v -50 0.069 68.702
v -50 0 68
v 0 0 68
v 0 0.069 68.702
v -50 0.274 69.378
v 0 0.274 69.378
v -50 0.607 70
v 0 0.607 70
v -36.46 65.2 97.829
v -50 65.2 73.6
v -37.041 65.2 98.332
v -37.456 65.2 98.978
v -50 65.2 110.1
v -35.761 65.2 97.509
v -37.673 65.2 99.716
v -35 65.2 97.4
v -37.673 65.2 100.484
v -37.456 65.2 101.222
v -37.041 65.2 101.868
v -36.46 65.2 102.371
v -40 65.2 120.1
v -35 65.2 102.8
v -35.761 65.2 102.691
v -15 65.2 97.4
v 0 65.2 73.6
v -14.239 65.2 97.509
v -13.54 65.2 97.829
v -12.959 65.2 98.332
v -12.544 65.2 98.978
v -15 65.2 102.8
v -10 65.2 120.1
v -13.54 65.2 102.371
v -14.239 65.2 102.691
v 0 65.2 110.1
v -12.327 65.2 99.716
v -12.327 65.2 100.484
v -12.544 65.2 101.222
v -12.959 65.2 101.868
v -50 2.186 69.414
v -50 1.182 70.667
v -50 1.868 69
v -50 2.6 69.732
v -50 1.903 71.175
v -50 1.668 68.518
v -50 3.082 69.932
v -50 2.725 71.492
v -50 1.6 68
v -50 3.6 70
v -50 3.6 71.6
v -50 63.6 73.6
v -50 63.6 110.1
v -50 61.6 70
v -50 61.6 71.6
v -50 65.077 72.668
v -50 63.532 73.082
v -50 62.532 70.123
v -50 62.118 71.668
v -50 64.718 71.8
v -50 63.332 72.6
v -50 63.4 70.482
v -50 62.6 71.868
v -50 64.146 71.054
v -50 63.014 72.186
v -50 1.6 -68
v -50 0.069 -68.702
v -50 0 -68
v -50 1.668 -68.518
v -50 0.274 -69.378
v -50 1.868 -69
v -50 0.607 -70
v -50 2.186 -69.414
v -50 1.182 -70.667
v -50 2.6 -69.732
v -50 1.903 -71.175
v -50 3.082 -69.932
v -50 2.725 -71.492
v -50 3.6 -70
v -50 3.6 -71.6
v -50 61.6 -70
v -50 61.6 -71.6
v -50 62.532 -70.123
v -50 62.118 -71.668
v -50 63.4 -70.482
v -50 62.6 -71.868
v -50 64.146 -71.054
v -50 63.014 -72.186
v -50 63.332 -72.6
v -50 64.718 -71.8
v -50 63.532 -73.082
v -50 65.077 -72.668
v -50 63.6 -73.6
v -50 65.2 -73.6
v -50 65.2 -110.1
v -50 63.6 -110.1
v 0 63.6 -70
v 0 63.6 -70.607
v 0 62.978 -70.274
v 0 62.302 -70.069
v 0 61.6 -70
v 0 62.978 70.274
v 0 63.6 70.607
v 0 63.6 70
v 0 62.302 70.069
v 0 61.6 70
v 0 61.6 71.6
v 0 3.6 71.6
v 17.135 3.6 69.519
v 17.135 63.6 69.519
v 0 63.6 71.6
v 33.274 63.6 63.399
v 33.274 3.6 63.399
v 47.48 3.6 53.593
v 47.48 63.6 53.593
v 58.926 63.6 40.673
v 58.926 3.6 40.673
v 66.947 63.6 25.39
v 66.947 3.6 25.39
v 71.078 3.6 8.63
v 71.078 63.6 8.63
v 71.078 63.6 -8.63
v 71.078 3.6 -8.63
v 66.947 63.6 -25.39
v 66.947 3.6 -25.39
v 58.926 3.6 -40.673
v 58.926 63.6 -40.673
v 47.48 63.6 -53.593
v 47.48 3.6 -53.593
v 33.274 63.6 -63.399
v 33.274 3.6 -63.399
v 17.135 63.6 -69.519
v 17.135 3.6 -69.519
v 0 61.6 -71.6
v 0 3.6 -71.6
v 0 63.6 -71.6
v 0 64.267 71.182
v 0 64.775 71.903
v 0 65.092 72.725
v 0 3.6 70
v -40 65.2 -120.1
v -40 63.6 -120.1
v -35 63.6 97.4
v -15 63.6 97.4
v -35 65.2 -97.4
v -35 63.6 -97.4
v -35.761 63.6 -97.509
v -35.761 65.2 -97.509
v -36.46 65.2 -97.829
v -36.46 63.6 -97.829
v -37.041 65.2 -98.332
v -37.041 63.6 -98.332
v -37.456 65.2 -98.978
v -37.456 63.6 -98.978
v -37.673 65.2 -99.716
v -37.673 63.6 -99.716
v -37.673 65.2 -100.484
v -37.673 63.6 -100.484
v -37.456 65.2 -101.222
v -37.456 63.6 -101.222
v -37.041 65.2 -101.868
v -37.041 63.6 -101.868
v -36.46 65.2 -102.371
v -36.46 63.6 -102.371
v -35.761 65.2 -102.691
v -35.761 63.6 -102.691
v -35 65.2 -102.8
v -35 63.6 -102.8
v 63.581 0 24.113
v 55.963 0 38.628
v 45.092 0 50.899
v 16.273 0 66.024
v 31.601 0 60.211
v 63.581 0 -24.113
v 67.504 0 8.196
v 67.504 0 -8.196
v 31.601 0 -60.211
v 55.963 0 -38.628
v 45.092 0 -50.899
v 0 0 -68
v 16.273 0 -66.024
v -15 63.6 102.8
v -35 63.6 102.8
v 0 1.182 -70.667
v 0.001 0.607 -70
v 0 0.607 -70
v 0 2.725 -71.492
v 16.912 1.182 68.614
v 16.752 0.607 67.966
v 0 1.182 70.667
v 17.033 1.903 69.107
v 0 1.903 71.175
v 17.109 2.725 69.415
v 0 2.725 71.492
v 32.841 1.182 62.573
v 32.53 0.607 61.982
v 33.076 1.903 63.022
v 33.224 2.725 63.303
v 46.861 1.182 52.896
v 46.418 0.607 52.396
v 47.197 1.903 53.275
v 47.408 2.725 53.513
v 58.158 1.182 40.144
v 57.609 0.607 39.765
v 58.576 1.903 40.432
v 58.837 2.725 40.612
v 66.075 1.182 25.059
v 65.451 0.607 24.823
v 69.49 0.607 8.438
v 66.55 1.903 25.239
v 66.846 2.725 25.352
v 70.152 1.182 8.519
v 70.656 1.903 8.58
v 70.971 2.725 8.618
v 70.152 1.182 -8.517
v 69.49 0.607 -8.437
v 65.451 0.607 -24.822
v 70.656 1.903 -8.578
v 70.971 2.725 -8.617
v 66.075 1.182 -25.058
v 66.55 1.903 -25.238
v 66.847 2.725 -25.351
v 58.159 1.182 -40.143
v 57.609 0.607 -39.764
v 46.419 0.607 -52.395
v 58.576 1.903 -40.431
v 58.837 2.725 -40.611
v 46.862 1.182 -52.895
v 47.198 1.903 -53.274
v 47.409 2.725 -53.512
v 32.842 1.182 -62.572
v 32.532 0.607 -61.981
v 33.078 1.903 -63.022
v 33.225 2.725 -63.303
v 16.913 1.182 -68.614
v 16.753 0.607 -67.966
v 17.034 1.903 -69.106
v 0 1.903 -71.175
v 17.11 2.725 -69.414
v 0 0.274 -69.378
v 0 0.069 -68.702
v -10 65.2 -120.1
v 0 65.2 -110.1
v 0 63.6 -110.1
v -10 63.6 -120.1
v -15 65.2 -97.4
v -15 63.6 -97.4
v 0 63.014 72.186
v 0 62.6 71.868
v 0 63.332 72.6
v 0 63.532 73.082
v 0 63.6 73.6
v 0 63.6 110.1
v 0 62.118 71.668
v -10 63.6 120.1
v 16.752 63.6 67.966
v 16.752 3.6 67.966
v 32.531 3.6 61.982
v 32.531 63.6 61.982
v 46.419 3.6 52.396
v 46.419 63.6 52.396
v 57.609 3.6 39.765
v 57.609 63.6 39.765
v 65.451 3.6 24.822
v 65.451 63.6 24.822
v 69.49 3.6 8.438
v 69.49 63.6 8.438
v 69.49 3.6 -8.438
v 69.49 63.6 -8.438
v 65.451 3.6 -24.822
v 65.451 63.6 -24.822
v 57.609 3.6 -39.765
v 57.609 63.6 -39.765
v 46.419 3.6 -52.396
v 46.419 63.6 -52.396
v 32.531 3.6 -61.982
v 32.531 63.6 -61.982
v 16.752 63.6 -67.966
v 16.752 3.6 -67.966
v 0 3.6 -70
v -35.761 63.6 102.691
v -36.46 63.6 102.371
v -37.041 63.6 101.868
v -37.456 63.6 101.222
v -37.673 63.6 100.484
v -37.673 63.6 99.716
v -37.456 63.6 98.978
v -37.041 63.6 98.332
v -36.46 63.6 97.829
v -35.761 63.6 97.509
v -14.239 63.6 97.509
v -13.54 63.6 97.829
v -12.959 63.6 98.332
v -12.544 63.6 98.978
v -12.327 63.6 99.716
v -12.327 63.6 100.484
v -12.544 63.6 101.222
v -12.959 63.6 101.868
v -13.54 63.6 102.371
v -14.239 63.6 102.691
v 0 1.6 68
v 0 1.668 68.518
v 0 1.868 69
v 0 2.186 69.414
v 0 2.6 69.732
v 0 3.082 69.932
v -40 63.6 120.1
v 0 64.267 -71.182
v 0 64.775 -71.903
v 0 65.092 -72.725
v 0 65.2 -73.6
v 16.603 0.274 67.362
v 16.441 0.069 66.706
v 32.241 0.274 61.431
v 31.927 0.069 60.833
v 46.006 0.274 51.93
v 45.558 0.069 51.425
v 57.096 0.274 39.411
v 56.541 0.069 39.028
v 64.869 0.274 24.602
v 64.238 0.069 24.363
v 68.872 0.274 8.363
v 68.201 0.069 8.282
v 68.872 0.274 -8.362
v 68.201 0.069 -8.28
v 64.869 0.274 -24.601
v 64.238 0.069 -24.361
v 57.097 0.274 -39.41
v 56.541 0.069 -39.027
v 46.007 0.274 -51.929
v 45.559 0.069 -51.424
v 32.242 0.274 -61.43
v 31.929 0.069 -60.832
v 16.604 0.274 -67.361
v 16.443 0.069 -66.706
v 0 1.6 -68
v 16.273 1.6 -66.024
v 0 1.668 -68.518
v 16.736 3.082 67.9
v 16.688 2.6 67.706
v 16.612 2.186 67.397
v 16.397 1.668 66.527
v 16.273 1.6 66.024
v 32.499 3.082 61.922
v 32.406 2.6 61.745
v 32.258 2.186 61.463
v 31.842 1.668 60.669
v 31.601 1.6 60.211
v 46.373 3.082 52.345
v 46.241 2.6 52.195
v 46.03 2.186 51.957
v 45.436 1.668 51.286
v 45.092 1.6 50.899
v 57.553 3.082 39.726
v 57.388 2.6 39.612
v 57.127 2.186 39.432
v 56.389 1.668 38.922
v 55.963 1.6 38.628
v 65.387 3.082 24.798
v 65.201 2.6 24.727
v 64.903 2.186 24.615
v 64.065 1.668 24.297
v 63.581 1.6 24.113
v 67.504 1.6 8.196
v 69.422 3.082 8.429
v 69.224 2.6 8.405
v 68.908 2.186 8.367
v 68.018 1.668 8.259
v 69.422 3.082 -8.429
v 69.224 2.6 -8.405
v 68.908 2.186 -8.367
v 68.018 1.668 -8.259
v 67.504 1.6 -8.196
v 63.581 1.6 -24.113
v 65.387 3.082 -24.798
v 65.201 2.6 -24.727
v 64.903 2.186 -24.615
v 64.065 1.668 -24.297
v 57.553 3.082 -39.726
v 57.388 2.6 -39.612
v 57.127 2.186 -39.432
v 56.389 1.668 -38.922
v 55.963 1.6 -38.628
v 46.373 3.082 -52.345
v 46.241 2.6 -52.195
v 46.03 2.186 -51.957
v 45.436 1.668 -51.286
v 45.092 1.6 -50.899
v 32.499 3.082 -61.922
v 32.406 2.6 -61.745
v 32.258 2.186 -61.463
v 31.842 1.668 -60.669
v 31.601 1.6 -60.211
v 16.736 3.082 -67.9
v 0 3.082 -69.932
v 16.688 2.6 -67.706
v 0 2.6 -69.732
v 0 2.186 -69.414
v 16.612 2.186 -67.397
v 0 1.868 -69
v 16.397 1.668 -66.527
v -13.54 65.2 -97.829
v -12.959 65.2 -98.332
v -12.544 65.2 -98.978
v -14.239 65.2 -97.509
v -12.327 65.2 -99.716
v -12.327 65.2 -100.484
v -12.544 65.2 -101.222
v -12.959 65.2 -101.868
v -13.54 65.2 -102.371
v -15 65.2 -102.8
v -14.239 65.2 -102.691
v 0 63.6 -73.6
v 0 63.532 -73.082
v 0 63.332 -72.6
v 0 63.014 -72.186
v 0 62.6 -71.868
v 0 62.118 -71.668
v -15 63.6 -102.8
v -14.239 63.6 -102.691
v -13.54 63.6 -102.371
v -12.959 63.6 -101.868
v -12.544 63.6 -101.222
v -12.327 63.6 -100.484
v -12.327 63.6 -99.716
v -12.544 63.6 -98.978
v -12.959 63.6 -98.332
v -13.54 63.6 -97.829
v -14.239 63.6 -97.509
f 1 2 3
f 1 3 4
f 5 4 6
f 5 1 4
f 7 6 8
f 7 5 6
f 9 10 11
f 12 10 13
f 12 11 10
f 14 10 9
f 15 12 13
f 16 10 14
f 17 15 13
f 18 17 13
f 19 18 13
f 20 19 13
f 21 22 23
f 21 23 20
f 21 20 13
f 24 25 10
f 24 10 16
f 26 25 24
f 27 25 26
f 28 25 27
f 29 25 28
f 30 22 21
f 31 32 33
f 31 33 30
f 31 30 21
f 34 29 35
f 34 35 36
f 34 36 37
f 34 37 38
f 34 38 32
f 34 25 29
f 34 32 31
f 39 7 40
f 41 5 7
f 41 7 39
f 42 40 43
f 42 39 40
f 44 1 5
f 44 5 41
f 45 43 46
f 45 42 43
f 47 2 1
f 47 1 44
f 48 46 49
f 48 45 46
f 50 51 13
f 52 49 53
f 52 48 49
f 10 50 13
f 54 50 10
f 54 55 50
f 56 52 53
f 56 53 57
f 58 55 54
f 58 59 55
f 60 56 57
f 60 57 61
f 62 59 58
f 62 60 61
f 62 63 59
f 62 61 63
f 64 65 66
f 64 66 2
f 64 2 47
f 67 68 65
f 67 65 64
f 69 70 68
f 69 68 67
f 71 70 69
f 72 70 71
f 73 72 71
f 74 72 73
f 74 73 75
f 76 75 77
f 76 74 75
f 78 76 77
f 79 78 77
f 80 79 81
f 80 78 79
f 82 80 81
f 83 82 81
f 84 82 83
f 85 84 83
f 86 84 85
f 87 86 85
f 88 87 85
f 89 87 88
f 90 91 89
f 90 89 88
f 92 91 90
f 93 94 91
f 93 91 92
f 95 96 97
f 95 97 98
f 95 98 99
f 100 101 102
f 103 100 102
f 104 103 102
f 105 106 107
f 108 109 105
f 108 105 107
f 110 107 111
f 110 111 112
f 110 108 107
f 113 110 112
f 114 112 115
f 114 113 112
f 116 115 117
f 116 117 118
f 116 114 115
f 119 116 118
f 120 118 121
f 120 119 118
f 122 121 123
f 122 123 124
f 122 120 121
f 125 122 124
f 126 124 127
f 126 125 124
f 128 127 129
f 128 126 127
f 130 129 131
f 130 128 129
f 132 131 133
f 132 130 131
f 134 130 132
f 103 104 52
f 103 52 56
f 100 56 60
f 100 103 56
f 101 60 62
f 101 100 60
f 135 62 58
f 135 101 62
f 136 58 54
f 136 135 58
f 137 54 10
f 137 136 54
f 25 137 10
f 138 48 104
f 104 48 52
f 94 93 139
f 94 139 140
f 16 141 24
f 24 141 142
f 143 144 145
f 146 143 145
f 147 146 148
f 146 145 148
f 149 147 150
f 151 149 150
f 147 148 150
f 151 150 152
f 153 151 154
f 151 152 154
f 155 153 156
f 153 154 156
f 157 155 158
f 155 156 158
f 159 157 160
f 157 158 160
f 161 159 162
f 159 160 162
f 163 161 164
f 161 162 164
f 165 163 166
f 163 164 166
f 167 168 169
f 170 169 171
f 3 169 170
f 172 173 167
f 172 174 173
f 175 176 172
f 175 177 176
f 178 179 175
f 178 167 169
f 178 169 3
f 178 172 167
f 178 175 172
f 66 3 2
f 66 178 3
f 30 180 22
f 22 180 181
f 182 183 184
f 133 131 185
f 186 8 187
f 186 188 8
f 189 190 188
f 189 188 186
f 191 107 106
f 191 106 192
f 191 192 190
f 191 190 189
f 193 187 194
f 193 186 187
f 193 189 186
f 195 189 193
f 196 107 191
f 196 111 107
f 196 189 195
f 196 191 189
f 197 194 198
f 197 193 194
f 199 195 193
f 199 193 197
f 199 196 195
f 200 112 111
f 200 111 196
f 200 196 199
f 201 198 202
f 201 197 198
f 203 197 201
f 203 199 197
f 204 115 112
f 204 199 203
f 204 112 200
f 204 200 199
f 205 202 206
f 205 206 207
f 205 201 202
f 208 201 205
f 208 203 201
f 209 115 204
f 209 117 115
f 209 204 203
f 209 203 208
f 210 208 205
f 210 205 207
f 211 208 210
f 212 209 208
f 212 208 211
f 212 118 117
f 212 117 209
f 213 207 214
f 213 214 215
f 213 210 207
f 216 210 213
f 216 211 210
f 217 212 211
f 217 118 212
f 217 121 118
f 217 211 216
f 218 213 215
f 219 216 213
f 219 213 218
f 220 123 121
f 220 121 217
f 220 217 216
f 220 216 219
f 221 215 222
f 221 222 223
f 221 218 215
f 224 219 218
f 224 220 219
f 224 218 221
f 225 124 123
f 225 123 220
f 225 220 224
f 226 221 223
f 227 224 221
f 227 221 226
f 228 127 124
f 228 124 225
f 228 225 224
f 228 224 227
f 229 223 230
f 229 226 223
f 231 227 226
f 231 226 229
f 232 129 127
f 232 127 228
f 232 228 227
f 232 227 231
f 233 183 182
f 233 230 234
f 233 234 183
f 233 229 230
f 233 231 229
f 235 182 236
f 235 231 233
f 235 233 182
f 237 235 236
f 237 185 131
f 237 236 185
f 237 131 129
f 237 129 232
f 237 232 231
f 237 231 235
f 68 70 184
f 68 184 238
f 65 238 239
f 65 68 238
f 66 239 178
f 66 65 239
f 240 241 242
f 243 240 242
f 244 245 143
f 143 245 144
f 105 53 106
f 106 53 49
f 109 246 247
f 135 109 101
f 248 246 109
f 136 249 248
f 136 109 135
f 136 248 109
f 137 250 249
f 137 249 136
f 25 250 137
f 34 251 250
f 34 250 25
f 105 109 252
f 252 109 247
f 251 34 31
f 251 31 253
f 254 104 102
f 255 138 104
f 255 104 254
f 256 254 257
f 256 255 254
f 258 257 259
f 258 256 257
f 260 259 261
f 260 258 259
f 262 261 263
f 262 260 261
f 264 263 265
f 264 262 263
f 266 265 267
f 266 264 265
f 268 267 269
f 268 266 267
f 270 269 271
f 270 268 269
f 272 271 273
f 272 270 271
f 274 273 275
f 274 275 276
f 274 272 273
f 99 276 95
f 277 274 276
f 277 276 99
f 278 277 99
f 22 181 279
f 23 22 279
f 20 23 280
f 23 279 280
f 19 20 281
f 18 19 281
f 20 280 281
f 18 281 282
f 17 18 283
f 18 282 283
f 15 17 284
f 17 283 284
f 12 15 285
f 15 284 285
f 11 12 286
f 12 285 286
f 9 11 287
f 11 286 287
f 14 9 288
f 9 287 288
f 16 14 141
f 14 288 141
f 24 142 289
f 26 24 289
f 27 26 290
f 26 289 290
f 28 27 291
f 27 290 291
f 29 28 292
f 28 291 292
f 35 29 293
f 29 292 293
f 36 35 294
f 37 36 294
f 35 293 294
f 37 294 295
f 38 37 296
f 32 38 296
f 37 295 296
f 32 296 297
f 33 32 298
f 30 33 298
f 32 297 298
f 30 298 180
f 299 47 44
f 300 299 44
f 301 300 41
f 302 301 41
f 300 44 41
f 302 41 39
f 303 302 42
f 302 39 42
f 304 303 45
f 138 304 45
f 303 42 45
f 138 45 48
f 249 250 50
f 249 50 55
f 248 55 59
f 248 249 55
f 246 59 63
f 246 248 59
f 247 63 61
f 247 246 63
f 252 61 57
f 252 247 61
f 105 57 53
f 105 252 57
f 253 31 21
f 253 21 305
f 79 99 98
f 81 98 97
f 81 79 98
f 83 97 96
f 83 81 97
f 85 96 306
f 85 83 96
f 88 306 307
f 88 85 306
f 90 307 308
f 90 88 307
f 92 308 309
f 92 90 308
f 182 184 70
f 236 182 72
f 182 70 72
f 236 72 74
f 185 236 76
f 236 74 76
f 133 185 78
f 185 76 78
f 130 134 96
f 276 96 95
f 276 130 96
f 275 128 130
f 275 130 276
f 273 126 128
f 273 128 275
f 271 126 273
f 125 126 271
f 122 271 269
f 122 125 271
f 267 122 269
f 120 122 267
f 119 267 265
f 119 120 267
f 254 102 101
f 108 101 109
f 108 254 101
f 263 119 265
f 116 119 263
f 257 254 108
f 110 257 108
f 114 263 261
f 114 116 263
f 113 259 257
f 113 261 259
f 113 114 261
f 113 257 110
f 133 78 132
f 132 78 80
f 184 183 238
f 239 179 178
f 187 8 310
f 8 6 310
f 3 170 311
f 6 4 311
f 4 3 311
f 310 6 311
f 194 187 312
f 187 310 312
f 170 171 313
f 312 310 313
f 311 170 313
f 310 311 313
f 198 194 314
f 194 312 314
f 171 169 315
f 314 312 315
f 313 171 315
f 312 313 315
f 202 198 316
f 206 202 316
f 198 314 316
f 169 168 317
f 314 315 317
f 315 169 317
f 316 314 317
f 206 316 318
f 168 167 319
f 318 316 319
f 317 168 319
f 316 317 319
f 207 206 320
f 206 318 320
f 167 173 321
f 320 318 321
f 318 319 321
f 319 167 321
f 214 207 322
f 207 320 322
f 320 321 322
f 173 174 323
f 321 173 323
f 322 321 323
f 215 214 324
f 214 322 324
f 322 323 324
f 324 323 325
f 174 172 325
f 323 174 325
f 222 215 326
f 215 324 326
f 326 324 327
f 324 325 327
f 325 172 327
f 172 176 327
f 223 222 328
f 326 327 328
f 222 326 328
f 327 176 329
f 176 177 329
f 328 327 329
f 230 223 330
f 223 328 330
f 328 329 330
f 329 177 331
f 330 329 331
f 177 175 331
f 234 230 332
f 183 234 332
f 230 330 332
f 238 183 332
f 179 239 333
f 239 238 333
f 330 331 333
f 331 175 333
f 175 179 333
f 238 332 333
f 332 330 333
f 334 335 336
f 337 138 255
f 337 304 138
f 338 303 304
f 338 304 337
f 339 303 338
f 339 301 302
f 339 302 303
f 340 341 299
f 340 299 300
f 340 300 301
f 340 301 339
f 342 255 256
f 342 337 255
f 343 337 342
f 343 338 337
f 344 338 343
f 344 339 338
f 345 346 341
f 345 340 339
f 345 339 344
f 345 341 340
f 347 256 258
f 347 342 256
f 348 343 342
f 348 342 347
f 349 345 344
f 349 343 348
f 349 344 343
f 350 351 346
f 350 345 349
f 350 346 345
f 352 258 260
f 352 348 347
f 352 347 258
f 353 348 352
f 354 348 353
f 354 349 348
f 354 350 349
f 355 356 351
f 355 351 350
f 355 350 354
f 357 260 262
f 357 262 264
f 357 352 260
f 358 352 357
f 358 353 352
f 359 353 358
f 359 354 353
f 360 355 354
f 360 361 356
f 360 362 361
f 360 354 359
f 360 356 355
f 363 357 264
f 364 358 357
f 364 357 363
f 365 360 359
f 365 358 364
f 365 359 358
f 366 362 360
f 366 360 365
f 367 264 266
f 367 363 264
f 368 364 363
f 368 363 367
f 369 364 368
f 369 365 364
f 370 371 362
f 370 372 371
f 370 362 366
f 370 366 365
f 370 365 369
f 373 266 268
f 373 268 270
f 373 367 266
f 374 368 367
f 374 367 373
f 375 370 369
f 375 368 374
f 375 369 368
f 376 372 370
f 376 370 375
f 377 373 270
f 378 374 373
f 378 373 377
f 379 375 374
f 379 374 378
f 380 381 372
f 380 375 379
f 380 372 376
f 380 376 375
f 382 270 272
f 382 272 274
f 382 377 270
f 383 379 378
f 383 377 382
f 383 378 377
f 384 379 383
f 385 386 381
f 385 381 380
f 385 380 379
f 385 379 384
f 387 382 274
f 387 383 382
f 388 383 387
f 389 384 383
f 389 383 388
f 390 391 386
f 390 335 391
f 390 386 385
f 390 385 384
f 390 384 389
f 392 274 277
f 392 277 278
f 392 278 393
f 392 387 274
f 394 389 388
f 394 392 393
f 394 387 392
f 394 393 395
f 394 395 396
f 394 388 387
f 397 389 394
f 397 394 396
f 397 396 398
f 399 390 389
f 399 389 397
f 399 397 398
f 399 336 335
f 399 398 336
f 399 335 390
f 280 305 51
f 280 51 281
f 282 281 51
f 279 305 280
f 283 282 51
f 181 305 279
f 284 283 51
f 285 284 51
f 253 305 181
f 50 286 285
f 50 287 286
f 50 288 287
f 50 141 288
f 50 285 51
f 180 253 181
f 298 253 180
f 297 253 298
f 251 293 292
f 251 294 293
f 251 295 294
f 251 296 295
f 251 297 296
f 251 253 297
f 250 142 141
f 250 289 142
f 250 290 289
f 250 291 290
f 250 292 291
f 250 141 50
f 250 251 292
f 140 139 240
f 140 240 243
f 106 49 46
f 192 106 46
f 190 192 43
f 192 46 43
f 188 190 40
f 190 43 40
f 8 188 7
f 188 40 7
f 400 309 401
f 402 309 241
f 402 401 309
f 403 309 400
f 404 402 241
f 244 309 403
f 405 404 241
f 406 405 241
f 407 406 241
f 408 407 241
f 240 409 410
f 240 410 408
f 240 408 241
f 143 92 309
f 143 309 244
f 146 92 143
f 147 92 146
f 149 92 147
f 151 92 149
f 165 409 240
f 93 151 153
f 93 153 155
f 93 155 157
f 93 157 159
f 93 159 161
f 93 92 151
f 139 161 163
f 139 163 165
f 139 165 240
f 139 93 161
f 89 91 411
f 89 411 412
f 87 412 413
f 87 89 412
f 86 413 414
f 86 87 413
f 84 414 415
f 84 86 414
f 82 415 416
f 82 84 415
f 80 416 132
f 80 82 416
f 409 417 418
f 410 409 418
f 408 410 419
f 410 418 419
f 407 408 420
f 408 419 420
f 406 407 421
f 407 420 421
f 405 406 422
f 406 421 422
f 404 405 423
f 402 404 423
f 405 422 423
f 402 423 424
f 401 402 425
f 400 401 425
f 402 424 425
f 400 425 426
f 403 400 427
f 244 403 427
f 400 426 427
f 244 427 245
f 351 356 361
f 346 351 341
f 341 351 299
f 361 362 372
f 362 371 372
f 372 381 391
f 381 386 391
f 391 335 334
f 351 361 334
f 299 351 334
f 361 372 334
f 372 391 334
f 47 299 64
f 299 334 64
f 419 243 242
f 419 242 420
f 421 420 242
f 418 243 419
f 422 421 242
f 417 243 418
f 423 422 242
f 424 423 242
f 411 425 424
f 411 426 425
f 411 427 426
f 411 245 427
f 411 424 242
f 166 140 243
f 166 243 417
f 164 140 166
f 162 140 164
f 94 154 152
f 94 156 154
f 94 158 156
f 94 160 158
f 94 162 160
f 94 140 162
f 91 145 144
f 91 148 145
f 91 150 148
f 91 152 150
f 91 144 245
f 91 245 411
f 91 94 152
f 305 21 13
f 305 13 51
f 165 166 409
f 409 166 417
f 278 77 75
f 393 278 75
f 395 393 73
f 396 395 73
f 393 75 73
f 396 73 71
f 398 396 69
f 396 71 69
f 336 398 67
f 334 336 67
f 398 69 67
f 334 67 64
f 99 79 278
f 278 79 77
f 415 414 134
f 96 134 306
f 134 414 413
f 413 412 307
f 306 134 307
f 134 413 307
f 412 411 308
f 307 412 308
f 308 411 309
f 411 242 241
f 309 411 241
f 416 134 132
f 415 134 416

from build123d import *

# Parameters (mm, degrees)
SM_BASE_FLANGE_2_DEPTH             = 1.6
SM_START                           = -50
SM_EDGE_FLANGE_2_DEPTH             = 121.6
SM_EDGE_FLANGE_2_2_DEPTH           = 50
SM_EDGE_FLANGE_2_3_ANGLE           = 180
SM_EDGE_FLANGE_2_4_ANGLE           = 180
SM_EDGE_FLANGE_3_STRIP_W           = 10.4
SM_EDGE_FLANGE_3_STRIP_H           = 1.6
SM_EDGE_FLANGE_3_STRIP_CUT_DEPTH   = 50
SM_EDGE_FLANGE_3_STRIP_2_W         = 10.4
SM_EDGE_FLANGE_3_STRIP_2_H         = 1.6
SM_EDGE_FLANGE_3_STRIP_CUT_2_DEPTH = 50
SM_EDGE_FLANGE_3_DEPTH             = 50
SM_EDGE_FLANGE_3_BEND_DEPTH        = 50
CHAMFER_1_SIZE                     = 10
CUT_EXTRUDE_1_REACH                = 155.608


with BuildPart() as part:
    # 基材-凸緣2: sheet metal written as solids
    # 草圖6 → 基材-凸緣2 (new body)
    with BuildSketch(Plane(origin=(0, 0, 0), x_dir=(1, 0, 0), z_dir=(0, 1, 0))):
        with BuildLine():
            Line((-50, 70), (0, 70))
            ThreePointArc((0, 70), (70, 0), (0, -70))
            Line((0, -70), (-50, -70))
            Line((-50, -70), (-50, 70))
        make_face()
    extrude(amount=SM_BASE_FLANGE_2_DEPTH)

    # 邊線-凸緣2: read off the stored shape, not the designer's step
    # 邊線-凸緣2 outline → 邊線-凸緣2 (cut)
    with BuildSketch(Plane.YZ.offset(SM_START)):
        with BuildLine():
            ThreePointArc((0, 68), (0.155005568, 69.044994432), (0.606674091, 70))
            Line((0.606674091, 70), (0, 70))
            Line((0, 70), (0, 68))
        make_face()
        with BuildLine():
            Line((0, -70), (0.606674091, -70))
            ThreePointArc((0.606674091, -70), (0.155005568, -69.044994432), (0, -68))
            Line((0, -68), (0, -70))
        make_face()
    extrude(amount=SM_EDGE_FLANGE_2_DEPTH, mode=Mode.SUBTRACT)

    # Sm Edge Flange 2 2 outline → Sm Edge Flange 2 2 (add)
    with BuildSketch(Plane.YZ.offset(SM_START)):
        with BuildLine():
            Line((3.6, 70), (63.6, 70))
            Line((63.6, 70), (63.6, 71.6))
            Line((63.6, 71.6), (3.6, 71.6))
            ThreePointArc((3.6, 71.6), (1.902943725, 71.174901573), (0.606674091, 70))
            Line((0.606674091, 70), (1.6, 70))
            Line((1.6, 70), (1.6, 68))
            ThreePointArc((1.6, 68), (2.185786438, 69.414213562), (3.6, 70))
        make_face()
        with BuildLine():
            Line((63.6, -71.6), (63.6, -70))
            Line((63.6, -70), (3.6, -70))
            ThreePointArc((3.6, -70), (2.185786438, -69.414213562), (1.6, -68))
            Line((1.6, -68), (1.6, -70))
            Line((1.6, -70), (0.606674091, -70))
            ThreePointArc((0.606674091, -70), (1.902943725, -71.174901573), (3.6, -71.6))
            Line((3.6, -71.6), (63.6, -71.6))
        make_face()
    extrude(amount=SM_EDGE_FLANGE_2_2_DEPTH)

    # Sm Edge Flange 2 3 outline → Sm Edge Flange 2 3 (revolve, cut)
    with BuildSketch(Plane.ZY):
        with BuildLine():
            ThreePointArc((70, 0.606674091), (69.044994432, 0.155005568), (68, 0))
            Line((68, 0), (70, 0))
            Line((70, 0), (70, 0.606674091))
        make_face()
    revolve(axis=Axis((0, 0, 0), (0, 1, 0)), revolution_arc=SM_EDGE_FLANGE_2_3_ANGLE, mode=Mode.SUBTRACT)

    # Sm Edge Flange 2 4 outline → Sm Edge Flange 2 4 (revolve)
    with BuildSketch(Plane.ZY):
        with BuildLine():
            Line((71.6, 63.6), (70, 63.6))
            Line((70, 63.6), (70, 3.6))
            ThreePointArc((70, 3.6), (69.414213562, 2.185786438), (68, 1.6))
            Line((68, 1.6), (70, 1.6))
            Line((70, 1.6), (70, 0.606674091))
            ThreePointArc((70, 0.606674091), (71.174901573, 1.902943725), (71.6, 3.6))
            Line((71.6, 3.6), (71.6, 63.6))
        make_face()
    revolve(axis=Axis((0, 0, 0), (0, 1, 0)), revolution_arc=SM_EDGE_FLANGE_2_4_ANGLE)

    # 邊線-凸緣3: sheet metal written as solids
    # 邊線-凸緣3 strip (on a plane across the edge) → 邊線-凸緣3 strip cut (cut)
    with BuildSketch(Plane(origin=(0, 63.6, 71.6), x_dir=(0, -1, 0), z_dir=(-1, 0, 0))):
        with Locations((-3.2, -0.8)):
            Rectangle(SM_EDGE_FLANGE_3_STRIP_W, SM_EDGE_FLANGE_3_STRIP_H)
    extrude(amount=SM_EDGE_FLANGE_3_STRIP_CUT_DEPTH, mode=Mode.SUBTRACT)

    # 邊線-凸緣3 strip 2 (on a plane across the edge) → 邊線-凸緣3 strip cut 2 (cut)
    with BuildSketch(Plane(origin=(-50, 63.6, -71.6), x_dir=(0, -1, 0), z_dir=(1, 0, 0))):
        with Locations((-3.2, -0.8)):
            Rectangle(SM_EDGE_FLANGE_3_STRIP_2_W, SM_EDGE_FLANGE_3_STRIP_2_H)
    extrude(amount=SM_EDGE_FLANGE_3_STRIP_CUT_2_DEPTH, mode=Mode.SUBTRACT)

    # 邊線-凸緣3 section (on a plane across the edge) → 邊線-凸緣3 (add)
    with BuildSketch(Plane(origin=(0, 63.6, 71.6), x_dir=(0, -1, 0), z_dir=(-1, 0, 0))):
        with BuildLine():
            Line((-1.6, 2), (-1.6, 48.5))
            Line((-1.6, 48.5), (0, 48.5))
            Line((0, 48.5), (0, 2))
            ThreePointArc((0, 2), (0.585786438, 0.585786438), (2, 0))
            Line((2, 0), (2, -1.6))
            ThreePointArc((2, -1.6), (-0.545584412, -0.545584412), (-1.6, 2))
        make_face()
    extrude(amount=SM_EDGE_FLANGE_3_DEPTH)

    # 邊線-凸緣3 section 2 (on a plane across the edge) → 邊線-凸緣3 bend (add)
    with BuildSketch(Plane(origin=(-50, 63.6, -71.6), x_dir=(0, -1, 0), z_dir=(1, 0, 0))):
        with BuildLine():
            Line((-1.6, 2), (-1.6, 48.5))
            Line((-1.6, 48.5), (0, 48.5))
            Line((0, 48.5), (0, 2))
            ThreePointArc((0, 2), (0.585786438, 0.585786438), (2, 0))
            Line((2, 0), (2, -1.6))
            ThreePointArc((2, -1.6), (-0.545584412, -0.545584412), (-1.6, 2))
        make_face()
    extrude(amount=SM_EDGE_FLANGE_3_BEND_DEPTH)

    # 導角1
    chamfer_1_edges = [part.edges().sort_by_distance(p)[0] for p in [
        (0, 64.4, 120.1),
        (-50, 64.4, 120.1),
        (-50, 64.4, -120.1),
        (0, 64.4, -120.1),
    ]]
    chamfer(chamfer_1_edges, length=CHAMFER_1_SIZE)

    # 草圖18 → 除料-伸長1 (cut, up to next)
    with BuildSketch(Plane.XZ.offset(-63.6), mode=Mode.PRIVATE) as cut_extrude_1_sk1:
        with BuildLine():
            Line((-35, 97.4), (-15, 97.4))
            ThreePointArc((-15, 97.4), (-12.3, 100.1), (-15, 102.8))
            Line((-15, 102.8), (-35, 102.8))
            ThreePointArc((-35, 102.8), (-37.7, 100.1), (-35, 97.4))
        make_face()
    cut_extrude_1_tool1 = extrude(cut_extrude_1_sk1.sketch, amount=-CUT_EXTRUDE_1_REACH, mode=Mode.PRIVATE) & part.part
    # 草圖18 → 除料-伸長1 (cut, up to next)
    with BuildSketch(Plane.XZ.offset(-63.6), mode=Mode.PRIVATE) as cut_extrude_1_sk2:
        with BuildLine():
            Line((-35, -102.8), (-15, -102.8))
            ThreePointArc((-15, -102.8), (-12.3, -100.1), (-15, -97.4))
            Line((-15, -97.4), (-35, -97.4))
            ThreePointArc((-35, -97.4), (-37.7, -100.1), (-35, -102.8))
        make_face()
    cut_extrude_1_tool2 = extrude(cut_extrude_1_sk2.sketch, amount=-CUT_EXTRUDE_1_REACH, mode=Mode.PRIVATE) & part.part
    add(cut_extrude_1_tool1.solids().sort_by_distance((-25, 63.6, 100.1))[0], mode=Mode.SUBTRACT)
    add(cut_extrude_1_tool2.solids().sort_by_distance((-25, 63.6, -100.1))[0], mode=Mode.SUBTRACT)


solid = part.part
